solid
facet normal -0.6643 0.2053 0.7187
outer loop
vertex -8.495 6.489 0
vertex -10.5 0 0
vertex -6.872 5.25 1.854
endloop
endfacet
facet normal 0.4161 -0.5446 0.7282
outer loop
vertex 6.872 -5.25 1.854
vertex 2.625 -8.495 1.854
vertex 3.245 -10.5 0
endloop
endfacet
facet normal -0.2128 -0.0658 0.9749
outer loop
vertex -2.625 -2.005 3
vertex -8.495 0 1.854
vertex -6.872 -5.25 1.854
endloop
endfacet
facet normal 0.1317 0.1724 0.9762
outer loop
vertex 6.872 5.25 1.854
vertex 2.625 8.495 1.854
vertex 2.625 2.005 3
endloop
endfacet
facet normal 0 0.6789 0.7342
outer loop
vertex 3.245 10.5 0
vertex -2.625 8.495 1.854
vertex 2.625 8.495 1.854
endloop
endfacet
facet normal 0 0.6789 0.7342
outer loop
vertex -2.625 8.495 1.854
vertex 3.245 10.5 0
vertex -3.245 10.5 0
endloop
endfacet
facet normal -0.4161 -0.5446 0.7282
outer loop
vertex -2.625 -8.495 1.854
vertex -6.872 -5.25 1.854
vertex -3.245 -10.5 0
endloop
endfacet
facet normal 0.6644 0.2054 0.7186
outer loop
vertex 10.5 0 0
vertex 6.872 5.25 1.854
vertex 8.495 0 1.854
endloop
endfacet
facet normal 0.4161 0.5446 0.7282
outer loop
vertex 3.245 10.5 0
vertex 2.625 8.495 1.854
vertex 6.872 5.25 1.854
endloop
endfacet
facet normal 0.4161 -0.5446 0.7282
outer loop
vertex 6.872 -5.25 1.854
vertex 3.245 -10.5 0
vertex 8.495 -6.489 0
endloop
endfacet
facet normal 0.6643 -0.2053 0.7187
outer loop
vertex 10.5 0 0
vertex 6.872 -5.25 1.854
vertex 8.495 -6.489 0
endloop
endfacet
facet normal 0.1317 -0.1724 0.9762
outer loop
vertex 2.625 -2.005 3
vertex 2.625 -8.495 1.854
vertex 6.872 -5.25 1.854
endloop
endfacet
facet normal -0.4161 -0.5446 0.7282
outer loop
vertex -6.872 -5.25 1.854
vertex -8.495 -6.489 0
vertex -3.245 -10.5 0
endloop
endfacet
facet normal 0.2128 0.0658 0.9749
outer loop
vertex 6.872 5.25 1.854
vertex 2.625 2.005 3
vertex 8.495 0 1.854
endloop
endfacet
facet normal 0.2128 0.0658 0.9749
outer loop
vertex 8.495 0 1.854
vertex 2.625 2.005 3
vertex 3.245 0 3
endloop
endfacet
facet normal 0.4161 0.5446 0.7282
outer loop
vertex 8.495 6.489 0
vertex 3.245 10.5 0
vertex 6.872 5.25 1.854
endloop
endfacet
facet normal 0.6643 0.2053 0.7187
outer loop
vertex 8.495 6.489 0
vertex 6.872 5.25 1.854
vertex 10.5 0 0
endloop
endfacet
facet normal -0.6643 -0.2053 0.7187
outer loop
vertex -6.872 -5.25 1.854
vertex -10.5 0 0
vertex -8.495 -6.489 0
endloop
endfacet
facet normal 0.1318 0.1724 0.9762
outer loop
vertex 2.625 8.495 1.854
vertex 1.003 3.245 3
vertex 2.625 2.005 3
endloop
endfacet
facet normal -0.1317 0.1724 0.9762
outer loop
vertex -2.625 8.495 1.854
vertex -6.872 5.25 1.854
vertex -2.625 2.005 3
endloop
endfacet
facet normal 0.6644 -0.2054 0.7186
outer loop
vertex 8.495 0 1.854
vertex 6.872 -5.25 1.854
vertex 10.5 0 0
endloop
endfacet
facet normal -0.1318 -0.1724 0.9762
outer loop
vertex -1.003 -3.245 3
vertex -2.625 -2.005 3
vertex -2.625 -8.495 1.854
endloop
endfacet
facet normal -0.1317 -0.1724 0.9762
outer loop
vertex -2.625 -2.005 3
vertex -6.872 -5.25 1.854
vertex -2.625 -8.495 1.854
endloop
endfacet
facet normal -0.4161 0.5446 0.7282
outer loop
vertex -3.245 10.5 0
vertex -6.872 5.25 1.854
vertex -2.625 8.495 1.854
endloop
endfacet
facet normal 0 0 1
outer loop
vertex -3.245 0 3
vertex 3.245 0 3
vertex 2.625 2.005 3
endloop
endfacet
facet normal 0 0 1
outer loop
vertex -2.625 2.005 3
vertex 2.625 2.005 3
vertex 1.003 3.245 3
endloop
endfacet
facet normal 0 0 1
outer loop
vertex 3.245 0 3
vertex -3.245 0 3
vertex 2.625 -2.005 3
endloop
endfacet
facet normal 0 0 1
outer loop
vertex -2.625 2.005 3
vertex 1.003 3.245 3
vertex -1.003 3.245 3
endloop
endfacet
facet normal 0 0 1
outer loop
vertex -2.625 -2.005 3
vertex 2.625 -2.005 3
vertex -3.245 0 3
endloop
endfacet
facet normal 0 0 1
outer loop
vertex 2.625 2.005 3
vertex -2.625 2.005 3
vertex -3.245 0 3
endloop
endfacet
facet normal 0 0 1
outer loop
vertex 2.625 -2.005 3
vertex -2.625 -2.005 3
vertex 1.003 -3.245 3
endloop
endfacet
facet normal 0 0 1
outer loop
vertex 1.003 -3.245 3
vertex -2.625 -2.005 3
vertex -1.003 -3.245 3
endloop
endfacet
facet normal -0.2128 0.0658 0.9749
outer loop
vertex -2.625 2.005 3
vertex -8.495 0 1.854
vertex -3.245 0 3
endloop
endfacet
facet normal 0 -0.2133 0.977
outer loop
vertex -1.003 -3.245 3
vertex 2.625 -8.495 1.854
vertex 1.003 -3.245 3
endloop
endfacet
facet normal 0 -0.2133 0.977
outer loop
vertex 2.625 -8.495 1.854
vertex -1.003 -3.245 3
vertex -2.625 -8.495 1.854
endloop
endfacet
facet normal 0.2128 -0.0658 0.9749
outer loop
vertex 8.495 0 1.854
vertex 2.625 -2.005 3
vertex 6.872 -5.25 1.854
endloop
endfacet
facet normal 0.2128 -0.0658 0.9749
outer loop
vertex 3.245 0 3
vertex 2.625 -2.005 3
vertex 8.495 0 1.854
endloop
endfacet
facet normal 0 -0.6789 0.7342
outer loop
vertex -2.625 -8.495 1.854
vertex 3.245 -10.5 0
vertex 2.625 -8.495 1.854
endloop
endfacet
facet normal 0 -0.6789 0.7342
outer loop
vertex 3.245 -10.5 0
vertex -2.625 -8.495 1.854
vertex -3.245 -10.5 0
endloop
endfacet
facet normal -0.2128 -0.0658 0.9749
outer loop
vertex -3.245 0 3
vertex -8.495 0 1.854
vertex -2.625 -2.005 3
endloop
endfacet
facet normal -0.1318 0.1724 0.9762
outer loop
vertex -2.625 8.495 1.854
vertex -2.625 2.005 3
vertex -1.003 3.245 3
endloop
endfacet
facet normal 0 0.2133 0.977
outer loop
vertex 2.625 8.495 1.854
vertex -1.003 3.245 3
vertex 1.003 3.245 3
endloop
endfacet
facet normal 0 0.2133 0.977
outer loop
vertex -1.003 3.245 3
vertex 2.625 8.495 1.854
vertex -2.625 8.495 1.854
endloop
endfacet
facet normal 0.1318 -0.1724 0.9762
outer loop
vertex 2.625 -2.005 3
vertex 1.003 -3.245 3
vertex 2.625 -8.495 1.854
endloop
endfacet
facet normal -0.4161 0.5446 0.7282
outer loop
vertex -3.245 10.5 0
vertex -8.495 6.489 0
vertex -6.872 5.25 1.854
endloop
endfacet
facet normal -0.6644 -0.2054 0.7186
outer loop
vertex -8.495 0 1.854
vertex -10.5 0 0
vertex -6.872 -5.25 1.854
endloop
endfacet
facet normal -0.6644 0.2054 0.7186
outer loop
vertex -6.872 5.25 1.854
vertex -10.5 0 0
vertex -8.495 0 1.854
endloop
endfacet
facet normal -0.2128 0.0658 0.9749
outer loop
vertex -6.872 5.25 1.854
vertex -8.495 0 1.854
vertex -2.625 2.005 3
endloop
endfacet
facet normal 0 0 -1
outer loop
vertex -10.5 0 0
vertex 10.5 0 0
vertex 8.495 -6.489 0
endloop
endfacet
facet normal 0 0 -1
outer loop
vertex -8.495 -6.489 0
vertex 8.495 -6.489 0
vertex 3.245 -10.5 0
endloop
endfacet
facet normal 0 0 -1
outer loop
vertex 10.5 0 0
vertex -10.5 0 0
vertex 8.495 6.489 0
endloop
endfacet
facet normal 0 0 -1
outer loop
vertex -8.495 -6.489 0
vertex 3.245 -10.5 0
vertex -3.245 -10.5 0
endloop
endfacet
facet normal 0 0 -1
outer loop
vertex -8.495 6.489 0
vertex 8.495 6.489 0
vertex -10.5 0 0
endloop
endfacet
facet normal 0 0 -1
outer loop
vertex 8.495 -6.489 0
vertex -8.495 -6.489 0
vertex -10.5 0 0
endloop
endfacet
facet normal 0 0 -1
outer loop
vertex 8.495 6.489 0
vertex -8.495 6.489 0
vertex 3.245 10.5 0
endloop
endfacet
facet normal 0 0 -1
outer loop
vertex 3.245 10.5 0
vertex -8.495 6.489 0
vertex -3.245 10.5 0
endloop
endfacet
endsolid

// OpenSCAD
// file: pad.scad
module pad(pad_diameter, pad_thickness) {
    resize([pad_diameter, pad_diameter, pad_thickness])
    sphere(d=pad_diameter, $fn=10);
}
// file: measures.scad
pad_diameter = 21;
pad_thickness = 6;
dome_diameter = 27;
dome_height = 8;
graft_hole_width = 3;
graft_hole_height = 4;
stick_height = 6;
stick_radius = 10/2;
graft_depth = 4;
graft_hole_depth = 5;
wall_size = 1;
// main file
include <measures.scad>
include <pad.scad>


difference(){
    pad(pad_diameter, pad_thickness);

    translate([-pad_diameter/2, -pad_diameter/2, -pad_thickness])
    cube([pad_diameter, pad_diameter, pad_thickness]);
}
